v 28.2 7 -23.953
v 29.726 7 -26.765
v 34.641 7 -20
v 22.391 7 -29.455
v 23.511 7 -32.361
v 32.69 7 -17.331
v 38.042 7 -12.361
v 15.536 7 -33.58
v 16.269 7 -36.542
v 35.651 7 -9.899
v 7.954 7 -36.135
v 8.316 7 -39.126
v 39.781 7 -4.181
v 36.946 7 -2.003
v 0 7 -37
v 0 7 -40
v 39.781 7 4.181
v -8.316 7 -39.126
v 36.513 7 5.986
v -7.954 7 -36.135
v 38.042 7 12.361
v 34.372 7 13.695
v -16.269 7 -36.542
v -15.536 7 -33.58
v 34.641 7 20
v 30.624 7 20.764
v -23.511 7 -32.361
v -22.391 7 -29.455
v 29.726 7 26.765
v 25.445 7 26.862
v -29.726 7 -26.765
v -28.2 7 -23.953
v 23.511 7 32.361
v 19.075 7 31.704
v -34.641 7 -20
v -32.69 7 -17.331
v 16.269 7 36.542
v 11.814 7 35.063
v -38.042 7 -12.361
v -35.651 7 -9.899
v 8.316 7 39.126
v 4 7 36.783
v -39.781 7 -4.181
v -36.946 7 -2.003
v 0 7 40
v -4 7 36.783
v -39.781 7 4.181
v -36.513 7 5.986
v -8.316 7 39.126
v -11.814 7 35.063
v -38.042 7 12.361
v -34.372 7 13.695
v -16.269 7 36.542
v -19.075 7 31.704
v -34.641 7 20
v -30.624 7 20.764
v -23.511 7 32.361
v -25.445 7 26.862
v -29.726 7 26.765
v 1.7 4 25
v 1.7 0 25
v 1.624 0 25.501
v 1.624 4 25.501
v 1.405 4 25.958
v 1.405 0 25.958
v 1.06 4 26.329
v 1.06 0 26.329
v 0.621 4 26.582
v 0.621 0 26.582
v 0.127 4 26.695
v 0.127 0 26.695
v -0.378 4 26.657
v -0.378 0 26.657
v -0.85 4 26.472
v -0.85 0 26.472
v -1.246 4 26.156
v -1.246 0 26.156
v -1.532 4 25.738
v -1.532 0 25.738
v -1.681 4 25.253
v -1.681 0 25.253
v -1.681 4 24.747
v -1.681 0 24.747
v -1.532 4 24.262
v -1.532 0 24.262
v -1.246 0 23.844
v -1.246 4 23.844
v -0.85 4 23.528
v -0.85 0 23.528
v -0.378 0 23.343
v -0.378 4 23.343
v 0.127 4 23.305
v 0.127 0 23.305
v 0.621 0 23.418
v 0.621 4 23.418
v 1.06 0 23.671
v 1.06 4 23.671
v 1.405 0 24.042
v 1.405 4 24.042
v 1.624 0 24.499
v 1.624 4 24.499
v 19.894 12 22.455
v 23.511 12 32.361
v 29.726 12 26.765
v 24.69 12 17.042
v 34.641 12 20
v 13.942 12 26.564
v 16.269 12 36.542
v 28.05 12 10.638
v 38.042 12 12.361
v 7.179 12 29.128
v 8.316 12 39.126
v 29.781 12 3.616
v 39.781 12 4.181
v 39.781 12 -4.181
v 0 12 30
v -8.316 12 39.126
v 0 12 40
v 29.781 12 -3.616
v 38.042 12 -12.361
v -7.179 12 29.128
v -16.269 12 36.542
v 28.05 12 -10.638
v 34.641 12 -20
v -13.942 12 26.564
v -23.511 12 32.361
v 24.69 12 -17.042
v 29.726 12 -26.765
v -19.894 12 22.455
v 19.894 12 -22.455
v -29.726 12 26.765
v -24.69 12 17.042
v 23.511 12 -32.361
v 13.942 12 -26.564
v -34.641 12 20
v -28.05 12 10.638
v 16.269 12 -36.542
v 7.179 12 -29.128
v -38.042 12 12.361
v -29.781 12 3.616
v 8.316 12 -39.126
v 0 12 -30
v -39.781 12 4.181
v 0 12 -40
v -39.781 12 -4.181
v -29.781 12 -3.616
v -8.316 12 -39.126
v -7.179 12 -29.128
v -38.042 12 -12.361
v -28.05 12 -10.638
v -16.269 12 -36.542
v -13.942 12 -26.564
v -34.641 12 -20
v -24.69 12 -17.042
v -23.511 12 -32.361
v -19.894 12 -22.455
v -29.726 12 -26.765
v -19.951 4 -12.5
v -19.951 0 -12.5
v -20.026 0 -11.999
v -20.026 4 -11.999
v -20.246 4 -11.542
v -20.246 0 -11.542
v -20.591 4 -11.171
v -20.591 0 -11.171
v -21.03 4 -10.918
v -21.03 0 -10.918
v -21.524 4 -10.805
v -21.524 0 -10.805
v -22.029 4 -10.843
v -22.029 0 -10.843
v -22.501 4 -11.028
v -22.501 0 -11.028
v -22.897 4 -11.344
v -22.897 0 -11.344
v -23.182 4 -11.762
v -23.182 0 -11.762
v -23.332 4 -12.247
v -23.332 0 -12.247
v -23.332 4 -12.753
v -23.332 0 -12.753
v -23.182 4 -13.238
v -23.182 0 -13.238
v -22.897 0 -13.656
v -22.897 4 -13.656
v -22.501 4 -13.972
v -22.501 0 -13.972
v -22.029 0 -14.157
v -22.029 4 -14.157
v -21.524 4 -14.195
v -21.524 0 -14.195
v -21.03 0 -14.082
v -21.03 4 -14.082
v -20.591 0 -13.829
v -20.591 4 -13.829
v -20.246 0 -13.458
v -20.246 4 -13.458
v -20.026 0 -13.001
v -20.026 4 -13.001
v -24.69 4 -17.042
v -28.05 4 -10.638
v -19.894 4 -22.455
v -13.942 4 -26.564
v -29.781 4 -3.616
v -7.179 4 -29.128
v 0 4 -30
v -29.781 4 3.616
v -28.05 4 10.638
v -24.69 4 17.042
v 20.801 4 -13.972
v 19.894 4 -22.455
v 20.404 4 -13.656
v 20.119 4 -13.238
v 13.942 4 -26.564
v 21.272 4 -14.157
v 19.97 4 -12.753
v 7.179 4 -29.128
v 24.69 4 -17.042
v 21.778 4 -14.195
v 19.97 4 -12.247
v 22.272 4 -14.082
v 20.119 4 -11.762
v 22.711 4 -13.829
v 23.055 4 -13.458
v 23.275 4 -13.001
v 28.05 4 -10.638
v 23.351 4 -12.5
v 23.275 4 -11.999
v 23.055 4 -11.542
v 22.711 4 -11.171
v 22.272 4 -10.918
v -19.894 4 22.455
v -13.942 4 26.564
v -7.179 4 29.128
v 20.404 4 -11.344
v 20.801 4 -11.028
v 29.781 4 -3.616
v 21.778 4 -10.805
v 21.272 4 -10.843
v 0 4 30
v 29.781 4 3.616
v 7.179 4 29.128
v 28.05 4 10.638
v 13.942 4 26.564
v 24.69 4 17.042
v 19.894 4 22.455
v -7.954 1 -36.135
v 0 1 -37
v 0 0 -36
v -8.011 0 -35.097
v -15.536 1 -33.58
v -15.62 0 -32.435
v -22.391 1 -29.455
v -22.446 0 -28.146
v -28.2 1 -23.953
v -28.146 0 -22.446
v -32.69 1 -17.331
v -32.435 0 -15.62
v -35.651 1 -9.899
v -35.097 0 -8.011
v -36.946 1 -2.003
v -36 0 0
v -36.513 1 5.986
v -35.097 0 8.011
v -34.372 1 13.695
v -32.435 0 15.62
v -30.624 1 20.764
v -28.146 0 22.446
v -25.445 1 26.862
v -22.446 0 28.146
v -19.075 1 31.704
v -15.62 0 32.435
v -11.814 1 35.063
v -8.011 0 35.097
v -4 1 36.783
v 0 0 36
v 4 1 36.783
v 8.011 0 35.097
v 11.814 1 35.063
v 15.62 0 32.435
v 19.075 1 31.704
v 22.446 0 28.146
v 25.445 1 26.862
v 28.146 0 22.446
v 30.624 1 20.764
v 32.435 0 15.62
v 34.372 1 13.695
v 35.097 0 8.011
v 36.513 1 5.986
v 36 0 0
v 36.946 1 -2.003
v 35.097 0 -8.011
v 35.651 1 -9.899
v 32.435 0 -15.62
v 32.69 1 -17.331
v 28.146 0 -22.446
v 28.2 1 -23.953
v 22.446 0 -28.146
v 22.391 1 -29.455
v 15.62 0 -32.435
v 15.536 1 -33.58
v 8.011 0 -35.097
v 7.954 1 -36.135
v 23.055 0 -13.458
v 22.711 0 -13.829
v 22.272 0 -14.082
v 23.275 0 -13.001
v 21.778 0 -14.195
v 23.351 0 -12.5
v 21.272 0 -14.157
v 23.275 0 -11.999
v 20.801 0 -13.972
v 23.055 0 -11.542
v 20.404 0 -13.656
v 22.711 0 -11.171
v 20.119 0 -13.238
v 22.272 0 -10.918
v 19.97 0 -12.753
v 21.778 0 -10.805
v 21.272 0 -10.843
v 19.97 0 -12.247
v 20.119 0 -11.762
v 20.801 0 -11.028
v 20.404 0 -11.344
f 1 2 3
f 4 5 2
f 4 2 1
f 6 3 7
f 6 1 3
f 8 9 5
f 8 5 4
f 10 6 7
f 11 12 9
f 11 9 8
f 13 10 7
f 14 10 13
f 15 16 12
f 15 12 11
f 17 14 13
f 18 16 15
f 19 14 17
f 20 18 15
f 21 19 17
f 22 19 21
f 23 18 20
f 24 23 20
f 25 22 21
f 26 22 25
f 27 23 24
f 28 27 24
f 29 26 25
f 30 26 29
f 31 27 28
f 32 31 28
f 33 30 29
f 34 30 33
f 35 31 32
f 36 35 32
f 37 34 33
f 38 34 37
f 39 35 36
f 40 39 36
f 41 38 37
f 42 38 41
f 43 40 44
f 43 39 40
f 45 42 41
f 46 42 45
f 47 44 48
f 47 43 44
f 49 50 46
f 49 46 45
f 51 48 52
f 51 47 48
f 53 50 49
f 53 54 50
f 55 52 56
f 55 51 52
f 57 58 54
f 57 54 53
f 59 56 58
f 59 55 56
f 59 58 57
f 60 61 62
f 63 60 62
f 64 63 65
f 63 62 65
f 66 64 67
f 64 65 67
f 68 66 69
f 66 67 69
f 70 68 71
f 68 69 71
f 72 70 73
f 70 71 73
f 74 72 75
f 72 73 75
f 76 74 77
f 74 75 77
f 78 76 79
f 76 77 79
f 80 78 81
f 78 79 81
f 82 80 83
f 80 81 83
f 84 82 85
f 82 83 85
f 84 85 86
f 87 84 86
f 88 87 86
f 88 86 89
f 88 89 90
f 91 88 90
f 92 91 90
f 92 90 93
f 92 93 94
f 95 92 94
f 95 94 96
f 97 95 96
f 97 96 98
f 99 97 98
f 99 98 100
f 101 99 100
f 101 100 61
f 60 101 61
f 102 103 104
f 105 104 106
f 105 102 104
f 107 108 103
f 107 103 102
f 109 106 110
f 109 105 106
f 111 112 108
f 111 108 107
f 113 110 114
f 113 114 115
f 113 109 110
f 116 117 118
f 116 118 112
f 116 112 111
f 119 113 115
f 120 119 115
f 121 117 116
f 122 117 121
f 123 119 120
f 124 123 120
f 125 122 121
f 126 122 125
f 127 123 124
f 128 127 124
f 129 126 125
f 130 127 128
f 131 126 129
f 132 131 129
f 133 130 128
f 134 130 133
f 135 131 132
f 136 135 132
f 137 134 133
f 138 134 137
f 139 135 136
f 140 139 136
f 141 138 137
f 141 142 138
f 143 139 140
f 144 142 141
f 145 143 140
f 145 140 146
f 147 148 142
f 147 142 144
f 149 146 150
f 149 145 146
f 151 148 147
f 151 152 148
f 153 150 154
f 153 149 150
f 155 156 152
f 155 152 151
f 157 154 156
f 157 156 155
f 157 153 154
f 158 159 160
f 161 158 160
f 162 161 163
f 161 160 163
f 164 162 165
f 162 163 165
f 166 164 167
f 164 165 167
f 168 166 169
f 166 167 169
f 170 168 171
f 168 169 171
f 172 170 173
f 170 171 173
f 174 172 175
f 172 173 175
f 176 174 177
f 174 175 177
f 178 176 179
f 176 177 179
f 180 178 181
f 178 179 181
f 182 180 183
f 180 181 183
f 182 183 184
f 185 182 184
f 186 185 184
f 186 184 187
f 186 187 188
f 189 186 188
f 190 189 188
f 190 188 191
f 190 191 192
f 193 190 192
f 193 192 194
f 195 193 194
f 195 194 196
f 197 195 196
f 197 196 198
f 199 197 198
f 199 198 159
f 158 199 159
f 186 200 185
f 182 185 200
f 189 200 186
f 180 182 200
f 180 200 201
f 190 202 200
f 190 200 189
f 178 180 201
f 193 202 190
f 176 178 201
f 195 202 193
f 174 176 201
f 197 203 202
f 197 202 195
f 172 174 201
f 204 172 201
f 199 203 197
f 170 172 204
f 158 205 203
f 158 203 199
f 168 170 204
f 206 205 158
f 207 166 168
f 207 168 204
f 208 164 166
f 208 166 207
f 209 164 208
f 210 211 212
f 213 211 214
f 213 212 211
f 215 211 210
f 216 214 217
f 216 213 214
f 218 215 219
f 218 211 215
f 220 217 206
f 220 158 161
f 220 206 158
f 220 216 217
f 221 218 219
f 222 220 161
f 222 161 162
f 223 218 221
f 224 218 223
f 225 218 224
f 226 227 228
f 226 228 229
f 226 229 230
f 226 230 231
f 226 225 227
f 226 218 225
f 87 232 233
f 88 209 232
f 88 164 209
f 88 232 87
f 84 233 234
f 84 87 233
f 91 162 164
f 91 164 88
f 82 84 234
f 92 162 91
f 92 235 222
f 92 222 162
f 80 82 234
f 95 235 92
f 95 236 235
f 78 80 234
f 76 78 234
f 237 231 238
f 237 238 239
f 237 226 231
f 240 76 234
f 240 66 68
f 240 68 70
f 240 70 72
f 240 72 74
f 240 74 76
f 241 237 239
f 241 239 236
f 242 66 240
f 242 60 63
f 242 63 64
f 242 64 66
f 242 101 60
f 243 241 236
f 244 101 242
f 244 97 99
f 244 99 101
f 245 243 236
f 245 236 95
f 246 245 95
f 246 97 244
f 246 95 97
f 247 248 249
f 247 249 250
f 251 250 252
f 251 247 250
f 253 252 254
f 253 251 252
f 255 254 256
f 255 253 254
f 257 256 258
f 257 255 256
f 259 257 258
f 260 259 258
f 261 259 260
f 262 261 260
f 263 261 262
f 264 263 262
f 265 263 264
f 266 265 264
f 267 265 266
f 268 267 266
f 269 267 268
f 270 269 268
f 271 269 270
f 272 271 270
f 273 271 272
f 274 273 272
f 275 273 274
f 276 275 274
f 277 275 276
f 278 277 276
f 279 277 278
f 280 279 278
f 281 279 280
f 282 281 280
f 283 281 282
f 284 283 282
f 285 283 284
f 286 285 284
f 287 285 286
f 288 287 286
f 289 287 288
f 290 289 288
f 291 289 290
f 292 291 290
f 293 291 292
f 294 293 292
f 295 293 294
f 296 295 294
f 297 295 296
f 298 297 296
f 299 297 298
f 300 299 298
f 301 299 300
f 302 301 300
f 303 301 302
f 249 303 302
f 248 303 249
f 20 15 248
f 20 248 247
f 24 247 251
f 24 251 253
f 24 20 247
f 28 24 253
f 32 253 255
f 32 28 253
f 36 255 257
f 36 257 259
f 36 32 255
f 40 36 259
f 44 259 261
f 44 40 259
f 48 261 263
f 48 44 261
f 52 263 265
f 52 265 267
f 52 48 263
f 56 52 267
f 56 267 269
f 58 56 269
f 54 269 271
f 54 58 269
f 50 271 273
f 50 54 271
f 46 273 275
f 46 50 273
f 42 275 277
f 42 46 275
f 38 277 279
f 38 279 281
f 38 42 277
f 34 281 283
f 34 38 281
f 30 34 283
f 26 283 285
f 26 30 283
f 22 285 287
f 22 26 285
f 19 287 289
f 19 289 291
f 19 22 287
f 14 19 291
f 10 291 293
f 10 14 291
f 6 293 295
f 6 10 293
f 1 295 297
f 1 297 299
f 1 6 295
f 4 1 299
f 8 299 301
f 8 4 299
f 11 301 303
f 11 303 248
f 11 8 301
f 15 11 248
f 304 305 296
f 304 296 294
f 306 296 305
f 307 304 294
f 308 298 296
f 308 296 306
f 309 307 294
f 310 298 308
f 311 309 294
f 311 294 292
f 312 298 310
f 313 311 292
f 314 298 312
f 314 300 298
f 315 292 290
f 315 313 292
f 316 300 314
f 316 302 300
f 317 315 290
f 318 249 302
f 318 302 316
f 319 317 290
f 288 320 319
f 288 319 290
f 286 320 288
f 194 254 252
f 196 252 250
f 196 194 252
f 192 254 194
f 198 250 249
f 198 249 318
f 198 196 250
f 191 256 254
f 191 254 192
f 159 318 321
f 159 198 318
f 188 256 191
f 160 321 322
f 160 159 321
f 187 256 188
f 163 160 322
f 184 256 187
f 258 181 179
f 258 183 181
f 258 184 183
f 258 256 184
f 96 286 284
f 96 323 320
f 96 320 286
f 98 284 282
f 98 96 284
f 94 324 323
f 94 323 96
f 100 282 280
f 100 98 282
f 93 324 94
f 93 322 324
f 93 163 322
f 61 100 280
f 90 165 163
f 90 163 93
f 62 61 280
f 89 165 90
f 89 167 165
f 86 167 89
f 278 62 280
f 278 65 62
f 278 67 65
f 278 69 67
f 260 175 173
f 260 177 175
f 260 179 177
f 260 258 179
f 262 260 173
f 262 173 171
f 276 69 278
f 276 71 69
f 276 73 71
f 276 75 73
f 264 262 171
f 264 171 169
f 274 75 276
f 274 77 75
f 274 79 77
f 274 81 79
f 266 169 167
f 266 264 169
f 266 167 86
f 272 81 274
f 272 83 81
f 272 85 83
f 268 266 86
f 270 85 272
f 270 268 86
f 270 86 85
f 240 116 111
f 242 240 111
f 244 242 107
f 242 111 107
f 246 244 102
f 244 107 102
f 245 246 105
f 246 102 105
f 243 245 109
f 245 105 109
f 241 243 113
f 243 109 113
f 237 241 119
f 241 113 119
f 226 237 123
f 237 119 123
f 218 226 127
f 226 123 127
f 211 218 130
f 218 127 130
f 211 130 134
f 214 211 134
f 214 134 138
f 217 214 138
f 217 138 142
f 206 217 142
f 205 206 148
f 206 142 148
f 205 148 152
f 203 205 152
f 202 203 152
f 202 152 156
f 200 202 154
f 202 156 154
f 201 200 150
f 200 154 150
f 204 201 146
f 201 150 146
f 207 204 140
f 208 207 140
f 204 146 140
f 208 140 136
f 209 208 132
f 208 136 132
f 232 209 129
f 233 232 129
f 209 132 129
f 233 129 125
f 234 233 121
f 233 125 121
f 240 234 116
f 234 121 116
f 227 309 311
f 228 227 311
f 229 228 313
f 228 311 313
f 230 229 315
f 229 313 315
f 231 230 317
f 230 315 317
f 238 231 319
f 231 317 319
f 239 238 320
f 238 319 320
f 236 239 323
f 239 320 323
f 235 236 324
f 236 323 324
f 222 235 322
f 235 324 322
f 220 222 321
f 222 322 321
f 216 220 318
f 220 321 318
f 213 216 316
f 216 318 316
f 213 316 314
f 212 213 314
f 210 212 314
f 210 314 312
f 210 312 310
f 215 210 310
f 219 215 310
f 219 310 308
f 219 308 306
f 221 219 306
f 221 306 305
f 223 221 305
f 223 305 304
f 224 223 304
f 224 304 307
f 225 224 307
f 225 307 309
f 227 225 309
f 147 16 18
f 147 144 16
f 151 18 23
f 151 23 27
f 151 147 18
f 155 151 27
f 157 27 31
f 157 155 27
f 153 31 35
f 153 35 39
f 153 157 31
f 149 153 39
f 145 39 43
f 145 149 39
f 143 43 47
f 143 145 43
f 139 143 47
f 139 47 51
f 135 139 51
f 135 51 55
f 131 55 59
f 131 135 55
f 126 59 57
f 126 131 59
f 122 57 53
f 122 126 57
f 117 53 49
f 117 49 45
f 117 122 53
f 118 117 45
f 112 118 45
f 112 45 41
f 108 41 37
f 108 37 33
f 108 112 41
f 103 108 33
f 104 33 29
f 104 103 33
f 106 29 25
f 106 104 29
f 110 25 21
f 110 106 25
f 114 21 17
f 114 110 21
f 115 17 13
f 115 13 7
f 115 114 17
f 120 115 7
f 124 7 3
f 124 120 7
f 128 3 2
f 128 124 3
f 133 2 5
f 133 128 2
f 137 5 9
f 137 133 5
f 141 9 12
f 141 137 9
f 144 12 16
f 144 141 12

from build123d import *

# Parameters (mm, degrees)
CHAMFER_1_SIZE      = 1
HOLE_WIZARD_M3_1_D  = 3.4
SKETCH_4_R          = 30
CUT_EXTRUDE_1_DEPTH = 8


with BuildPart() as part:
    # 草图1 → 旋转1 (revolve)
    with BuildSketch(Plane(origin=(0, 0, 0), x_dir=(0, 0, -1), z_dir=(1, 0, 0))):
        Polygon((0, 0), (37, 0), (37, 7), (40, 7), (40, 12), (0, 12), align=None)
    revolve(axis=Axis((0, 0, 0), (0, 1, 0)))

    # 倒角1
    chamfer_1_edges = [part.edges().sort_by_distance(p)[0] for p in [
        (0, 0, 37),
    ]]
    chamfer(chamfer_1_edges, length=CHAMFER_1_SIZE)

    # M3 间隙孔1 (through all)
    with Locations(Plane(origin=(0, 12, 0), x_dir=(-1, 0, 0), z_dir=(0, 1, 0))):
        with Locations((0, 25), (-21.650635095, -12.5), (21.650635095, -12.5)):
            Hole(HOLE_WIZARD_M3_1_D / 2)

    # 草图4 → 切除-拉伸1 (cut)
    with BuildSketch(Plane(origin=(0, 12, 0), x_dir=(1, 0, 0), z_dir=(0, 1, 0))):
        with Locations(Location((0, 0, 0), (0, 0, 270))):
            Circle(SKETCH_4_R)
    extrude(amount=-CUT_EXTRUDE_1_DEPTH, mode=Mode.SUBTRACT)


solid = part.part
